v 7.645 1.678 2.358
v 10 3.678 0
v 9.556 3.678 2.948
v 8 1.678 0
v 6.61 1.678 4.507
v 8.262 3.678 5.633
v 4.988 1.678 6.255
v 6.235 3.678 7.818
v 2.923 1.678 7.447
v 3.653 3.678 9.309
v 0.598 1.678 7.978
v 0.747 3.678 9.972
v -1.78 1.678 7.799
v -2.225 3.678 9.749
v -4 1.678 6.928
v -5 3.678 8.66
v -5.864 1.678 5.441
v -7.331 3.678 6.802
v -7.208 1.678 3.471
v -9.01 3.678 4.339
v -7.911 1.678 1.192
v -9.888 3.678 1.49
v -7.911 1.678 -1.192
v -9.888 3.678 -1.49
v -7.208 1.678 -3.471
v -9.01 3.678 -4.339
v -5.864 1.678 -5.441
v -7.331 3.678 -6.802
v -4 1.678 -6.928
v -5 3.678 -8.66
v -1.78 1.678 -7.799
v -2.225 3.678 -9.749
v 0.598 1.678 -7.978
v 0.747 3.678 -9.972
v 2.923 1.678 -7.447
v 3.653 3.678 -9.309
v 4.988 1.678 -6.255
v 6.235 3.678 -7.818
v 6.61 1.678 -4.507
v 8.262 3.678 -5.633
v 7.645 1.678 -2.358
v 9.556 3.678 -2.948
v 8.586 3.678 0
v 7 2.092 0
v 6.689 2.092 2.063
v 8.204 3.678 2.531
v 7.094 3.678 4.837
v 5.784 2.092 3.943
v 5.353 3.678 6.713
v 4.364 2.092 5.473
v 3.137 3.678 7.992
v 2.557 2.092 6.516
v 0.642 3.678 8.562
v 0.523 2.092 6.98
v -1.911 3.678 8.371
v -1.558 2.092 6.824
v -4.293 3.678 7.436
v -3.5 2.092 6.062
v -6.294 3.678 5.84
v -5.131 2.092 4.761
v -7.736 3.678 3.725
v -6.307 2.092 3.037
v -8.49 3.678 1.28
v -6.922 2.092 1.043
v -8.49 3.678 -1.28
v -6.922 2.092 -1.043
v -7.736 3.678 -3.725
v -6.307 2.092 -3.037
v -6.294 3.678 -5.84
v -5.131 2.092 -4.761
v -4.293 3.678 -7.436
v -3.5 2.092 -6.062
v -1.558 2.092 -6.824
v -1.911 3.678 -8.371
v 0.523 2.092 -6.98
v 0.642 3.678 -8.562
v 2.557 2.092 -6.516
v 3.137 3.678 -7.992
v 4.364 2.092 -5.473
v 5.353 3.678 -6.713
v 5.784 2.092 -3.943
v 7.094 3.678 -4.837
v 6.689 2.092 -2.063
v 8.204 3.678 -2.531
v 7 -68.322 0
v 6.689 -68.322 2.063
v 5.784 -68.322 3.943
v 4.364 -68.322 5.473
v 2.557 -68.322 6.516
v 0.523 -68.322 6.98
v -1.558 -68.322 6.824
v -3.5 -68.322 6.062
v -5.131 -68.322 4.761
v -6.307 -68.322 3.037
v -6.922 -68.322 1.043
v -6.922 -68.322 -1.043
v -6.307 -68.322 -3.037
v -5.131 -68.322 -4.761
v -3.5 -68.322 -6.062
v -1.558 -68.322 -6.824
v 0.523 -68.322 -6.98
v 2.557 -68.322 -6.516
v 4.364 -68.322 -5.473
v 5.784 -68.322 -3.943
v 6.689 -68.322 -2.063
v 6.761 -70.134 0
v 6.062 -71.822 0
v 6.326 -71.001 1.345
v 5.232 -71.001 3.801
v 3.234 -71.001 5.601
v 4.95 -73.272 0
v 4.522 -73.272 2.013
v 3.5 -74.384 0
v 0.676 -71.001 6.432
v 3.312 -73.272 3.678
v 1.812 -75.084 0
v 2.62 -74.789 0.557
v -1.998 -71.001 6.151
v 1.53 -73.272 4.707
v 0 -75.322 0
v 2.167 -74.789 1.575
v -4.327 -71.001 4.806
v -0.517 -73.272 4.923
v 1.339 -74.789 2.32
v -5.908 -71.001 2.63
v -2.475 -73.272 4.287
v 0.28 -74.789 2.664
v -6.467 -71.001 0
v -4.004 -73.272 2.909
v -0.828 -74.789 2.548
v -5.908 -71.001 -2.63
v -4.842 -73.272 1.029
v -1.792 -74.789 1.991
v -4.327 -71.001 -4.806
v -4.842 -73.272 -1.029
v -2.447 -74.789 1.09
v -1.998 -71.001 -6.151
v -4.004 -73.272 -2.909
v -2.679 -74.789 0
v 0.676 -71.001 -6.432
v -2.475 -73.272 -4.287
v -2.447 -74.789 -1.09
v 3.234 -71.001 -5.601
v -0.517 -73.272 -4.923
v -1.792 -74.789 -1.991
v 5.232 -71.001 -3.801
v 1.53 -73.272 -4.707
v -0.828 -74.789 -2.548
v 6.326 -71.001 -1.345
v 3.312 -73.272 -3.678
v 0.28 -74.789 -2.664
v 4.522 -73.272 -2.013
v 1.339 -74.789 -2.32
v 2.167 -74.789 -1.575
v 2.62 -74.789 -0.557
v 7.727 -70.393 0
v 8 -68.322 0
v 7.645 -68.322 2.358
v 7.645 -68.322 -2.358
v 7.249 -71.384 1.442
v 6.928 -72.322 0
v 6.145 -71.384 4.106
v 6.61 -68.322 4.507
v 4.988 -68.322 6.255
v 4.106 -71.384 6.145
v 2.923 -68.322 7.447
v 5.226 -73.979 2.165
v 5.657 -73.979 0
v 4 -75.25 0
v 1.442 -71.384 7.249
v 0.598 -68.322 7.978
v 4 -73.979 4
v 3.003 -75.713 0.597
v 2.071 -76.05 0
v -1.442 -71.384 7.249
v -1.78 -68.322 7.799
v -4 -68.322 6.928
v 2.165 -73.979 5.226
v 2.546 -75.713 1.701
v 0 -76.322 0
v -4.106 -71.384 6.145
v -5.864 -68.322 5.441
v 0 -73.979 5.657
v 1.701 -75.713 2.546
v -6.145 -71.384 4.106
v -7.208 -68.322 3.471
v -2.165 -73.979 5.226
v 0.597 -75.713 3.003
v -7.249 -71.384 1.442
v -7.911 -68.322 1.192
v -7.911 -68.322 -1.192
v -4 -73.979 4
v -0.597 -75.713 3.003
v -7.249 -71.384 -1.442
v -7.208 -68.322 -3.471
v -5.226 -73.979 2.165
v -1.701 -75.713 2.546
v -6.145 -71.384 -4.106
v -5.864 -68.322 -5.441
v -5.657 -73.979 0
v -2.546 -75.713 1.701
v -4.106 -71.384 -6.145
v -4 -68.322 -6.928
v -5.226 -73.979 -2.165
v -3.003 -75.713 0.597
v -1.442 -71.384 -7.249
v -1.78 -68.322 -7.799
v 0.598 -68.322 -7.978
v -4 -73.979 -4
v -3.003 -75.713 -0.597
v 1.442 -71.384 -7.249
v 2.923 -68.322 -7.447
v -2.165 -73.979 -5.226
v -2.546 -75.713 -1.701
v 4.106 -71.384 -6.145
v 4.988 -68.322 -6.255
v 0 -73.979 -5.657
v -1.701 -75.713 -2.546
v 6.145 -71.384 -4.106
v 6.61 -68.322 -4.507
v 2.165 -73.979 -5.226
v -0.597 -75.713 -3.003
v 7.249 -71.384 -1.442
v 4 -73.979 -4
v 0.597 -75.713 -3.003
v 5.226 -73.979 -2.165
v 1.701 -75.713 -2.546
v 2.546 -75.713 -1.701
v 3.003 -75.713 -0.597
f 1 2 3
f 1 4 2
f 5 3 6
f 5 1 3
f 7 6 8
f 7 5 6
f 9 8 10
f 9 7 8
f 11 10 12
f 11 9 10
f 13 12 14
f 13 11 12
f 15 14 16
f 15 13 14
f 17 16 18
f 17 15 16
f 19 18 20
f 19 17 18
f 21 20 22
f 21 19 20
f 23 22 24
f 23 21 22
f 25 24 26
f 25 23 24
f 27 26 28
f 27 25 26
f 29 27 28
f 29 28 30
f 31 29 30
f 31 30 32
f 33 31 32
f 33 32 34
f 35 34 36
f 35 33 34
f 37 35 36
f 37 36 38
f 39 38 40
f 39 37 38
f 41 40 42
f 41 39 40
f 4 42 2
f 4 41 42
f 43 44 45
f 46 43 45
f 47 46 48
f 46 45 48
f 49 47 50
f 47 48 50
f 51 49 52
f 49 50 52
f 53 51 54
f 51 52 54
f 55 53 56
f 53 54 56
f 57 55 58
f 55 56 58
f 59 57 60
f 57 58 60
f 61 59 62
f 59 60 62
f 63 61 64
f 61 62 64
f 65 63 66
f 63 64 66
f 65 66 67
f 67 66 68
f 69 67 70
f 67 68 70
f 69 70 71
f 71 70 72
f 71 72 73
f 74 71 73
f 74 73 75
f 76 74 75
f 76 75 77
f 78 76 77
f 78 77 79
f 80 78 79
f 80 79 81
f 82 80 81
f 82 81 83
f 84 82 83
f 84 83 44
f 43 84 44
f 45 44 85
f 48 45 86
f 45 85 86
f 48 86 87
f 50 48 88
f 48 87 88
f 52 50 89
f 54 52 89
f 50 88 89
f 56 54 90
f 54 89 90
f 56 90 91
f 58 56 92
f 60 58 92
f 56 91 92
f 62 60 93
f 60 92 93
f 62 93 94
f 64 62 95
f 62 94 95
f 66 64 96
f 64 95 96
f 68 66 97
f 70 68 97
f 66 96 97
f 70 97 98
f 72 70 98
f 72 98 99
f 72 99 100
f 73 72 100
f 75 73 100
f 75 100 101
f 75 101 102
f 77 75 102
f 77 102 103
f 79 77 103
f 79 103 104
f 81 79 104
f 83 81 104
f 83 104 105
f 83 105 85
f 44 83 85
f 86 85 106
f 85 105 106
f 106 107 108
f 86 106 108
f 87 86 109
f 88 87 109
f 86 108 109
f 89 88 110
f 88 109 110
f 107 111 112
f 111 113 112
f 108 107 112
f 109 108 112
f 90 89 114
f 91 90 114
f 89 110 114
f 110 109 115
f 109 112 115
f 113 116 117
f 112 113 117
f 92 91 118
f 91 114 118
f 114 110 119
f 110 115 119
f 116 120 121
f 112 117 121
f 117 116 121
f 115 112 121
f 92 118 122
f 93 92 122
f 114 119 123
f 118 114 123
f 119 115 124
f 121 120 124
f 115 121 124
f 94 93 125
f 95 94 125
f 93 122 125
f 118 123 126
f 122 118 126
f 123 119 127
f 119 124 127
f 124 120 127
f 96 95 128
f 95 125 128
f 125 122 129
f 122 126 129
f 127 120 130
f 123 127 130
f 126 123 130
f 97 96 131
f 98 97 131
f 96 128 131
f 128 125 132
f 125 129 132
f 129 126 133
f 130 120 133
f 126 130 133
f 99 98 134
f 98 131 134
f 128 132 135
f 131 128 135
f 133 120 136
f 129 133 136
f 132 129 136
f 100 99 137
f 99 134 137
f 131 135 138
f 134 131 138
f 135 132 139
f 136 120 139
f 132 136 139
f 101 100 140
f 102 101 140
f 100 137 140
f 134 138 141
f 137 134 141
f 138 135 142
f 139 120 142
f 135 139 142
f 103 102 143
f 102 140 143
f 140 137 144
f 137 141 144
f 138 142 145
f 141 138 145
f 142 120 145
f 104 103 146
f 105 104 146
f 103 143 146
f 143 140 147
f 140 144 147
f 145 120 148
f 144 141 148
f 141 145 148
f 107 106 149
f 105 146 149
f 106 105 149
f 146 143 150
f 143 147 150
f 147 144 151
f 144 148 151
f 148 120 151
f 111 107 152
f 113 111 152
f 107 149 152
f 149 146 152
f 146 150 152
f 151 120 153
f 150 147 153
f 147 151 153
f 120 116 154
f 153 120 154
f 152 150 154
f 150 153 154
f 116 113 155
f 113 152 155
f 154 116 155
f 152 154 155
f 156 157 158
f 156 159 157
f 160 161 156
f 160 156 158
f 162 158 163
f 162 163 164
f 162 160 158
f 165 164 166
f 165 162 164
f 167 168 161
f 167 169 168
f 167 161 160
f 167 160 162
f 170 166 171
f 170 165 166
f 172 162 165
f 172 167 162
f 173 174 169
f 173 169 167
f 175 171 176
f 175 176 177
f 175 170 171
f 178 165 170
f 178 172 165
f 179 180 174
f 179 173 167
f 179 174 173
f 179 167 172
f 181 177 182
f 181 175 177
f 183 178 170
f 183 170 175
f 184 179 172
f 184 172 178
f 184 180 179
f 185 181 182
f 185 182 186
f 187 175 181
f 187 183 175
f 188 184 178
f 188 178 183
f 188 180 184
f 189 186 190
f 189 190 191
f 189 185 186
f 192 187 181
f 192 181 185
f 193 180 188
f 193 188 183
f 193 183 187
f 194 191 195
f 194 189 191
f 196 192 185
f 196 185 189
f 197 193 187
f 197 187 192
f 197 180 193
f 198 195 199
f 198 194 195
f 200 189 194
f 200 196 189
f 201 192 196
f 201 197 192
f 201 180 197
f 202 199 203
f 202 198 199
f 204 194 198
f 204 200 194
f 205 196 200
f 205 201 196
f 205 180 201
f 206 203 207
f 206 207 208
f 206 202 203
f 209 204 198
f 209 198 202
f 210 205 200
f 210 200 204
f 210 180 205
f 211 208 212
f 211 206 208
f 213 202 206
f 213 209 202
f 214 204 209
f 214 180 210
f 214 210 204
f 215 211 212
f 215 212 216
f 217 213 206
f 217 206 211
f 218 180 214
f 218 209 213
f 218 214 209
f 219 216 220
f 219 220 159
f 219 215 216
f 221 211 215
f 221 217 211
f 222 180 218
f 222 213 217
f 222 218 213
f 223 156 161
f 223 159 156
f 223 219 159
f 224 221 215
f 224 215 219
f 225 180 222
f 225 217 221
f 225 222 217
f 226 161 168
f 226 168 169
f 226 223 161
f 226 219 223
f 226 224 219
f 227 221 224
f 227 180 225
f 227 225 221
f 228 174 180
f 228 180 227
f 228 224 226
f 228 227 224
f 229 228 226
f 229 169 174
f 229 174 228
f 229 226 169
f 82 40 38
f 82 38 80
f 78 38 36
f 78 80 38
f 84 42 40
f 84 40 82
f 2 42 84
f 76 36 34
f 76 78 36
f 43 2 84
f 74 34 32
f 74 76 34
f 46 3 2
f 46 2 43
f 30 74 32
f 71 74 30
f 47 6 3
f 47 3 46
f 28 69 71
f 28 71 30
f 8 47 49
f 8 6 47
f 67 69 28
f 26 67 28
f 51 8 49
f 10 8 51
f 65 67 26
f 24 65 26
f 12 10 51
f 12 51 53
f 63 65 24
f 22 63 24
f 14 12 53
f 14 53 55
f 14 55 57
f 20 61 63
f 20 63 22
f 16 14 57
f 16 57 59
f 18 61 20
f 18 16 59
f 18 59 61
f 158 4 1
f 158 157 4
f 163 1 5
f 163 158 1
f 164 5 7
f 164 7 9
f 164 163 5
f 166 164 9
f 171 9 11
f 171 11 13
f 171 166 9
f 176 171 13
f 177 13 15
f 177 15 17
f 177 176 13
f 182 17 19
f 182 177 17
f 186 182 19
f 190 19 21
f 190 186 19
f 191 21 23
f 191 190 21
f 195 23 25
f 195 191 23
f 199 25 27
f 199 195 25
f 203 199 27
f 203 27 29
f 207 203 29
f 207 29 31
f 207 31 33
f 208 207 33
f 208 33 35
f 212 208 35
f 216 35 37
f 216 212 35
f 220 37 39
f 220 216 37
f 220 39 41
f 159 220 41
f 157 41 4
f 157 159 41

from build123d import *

# Parameters (mm, degrees)
SHELL8_T = -1


with BuildPart() as part:
    # Sketch1 → Revolve2 (revolve)
    with BuildSketch(Plane.XY):
        with BuildLine():
            Line((0, 3.677706493), (10, 3.677706493))
            Line((10, 3.677706493), (8, 1.677706493))
            Line((8, 1.677706493), (8, -68.322293507))
            ThreePointArc((8, -68.322293507), (5.656854249, -73.979147757), (0, -76.322293507))
            Line((0, -76.322293507), (0, 3.677706493))
        make_face()
    revolve(axis=Axis((0, 3.677706493, 0), (0, -1, 0)))

    # Shell8
    shell8_openings = [part.faces().sort_by_distance(p)[0] for p in [
        (-10, 3.677706493, 0),
    ]]
    offset(amount=SHELL8_T, openings=shell8_openings, kind=Kind.INTERSECTION)


solid = part.part
